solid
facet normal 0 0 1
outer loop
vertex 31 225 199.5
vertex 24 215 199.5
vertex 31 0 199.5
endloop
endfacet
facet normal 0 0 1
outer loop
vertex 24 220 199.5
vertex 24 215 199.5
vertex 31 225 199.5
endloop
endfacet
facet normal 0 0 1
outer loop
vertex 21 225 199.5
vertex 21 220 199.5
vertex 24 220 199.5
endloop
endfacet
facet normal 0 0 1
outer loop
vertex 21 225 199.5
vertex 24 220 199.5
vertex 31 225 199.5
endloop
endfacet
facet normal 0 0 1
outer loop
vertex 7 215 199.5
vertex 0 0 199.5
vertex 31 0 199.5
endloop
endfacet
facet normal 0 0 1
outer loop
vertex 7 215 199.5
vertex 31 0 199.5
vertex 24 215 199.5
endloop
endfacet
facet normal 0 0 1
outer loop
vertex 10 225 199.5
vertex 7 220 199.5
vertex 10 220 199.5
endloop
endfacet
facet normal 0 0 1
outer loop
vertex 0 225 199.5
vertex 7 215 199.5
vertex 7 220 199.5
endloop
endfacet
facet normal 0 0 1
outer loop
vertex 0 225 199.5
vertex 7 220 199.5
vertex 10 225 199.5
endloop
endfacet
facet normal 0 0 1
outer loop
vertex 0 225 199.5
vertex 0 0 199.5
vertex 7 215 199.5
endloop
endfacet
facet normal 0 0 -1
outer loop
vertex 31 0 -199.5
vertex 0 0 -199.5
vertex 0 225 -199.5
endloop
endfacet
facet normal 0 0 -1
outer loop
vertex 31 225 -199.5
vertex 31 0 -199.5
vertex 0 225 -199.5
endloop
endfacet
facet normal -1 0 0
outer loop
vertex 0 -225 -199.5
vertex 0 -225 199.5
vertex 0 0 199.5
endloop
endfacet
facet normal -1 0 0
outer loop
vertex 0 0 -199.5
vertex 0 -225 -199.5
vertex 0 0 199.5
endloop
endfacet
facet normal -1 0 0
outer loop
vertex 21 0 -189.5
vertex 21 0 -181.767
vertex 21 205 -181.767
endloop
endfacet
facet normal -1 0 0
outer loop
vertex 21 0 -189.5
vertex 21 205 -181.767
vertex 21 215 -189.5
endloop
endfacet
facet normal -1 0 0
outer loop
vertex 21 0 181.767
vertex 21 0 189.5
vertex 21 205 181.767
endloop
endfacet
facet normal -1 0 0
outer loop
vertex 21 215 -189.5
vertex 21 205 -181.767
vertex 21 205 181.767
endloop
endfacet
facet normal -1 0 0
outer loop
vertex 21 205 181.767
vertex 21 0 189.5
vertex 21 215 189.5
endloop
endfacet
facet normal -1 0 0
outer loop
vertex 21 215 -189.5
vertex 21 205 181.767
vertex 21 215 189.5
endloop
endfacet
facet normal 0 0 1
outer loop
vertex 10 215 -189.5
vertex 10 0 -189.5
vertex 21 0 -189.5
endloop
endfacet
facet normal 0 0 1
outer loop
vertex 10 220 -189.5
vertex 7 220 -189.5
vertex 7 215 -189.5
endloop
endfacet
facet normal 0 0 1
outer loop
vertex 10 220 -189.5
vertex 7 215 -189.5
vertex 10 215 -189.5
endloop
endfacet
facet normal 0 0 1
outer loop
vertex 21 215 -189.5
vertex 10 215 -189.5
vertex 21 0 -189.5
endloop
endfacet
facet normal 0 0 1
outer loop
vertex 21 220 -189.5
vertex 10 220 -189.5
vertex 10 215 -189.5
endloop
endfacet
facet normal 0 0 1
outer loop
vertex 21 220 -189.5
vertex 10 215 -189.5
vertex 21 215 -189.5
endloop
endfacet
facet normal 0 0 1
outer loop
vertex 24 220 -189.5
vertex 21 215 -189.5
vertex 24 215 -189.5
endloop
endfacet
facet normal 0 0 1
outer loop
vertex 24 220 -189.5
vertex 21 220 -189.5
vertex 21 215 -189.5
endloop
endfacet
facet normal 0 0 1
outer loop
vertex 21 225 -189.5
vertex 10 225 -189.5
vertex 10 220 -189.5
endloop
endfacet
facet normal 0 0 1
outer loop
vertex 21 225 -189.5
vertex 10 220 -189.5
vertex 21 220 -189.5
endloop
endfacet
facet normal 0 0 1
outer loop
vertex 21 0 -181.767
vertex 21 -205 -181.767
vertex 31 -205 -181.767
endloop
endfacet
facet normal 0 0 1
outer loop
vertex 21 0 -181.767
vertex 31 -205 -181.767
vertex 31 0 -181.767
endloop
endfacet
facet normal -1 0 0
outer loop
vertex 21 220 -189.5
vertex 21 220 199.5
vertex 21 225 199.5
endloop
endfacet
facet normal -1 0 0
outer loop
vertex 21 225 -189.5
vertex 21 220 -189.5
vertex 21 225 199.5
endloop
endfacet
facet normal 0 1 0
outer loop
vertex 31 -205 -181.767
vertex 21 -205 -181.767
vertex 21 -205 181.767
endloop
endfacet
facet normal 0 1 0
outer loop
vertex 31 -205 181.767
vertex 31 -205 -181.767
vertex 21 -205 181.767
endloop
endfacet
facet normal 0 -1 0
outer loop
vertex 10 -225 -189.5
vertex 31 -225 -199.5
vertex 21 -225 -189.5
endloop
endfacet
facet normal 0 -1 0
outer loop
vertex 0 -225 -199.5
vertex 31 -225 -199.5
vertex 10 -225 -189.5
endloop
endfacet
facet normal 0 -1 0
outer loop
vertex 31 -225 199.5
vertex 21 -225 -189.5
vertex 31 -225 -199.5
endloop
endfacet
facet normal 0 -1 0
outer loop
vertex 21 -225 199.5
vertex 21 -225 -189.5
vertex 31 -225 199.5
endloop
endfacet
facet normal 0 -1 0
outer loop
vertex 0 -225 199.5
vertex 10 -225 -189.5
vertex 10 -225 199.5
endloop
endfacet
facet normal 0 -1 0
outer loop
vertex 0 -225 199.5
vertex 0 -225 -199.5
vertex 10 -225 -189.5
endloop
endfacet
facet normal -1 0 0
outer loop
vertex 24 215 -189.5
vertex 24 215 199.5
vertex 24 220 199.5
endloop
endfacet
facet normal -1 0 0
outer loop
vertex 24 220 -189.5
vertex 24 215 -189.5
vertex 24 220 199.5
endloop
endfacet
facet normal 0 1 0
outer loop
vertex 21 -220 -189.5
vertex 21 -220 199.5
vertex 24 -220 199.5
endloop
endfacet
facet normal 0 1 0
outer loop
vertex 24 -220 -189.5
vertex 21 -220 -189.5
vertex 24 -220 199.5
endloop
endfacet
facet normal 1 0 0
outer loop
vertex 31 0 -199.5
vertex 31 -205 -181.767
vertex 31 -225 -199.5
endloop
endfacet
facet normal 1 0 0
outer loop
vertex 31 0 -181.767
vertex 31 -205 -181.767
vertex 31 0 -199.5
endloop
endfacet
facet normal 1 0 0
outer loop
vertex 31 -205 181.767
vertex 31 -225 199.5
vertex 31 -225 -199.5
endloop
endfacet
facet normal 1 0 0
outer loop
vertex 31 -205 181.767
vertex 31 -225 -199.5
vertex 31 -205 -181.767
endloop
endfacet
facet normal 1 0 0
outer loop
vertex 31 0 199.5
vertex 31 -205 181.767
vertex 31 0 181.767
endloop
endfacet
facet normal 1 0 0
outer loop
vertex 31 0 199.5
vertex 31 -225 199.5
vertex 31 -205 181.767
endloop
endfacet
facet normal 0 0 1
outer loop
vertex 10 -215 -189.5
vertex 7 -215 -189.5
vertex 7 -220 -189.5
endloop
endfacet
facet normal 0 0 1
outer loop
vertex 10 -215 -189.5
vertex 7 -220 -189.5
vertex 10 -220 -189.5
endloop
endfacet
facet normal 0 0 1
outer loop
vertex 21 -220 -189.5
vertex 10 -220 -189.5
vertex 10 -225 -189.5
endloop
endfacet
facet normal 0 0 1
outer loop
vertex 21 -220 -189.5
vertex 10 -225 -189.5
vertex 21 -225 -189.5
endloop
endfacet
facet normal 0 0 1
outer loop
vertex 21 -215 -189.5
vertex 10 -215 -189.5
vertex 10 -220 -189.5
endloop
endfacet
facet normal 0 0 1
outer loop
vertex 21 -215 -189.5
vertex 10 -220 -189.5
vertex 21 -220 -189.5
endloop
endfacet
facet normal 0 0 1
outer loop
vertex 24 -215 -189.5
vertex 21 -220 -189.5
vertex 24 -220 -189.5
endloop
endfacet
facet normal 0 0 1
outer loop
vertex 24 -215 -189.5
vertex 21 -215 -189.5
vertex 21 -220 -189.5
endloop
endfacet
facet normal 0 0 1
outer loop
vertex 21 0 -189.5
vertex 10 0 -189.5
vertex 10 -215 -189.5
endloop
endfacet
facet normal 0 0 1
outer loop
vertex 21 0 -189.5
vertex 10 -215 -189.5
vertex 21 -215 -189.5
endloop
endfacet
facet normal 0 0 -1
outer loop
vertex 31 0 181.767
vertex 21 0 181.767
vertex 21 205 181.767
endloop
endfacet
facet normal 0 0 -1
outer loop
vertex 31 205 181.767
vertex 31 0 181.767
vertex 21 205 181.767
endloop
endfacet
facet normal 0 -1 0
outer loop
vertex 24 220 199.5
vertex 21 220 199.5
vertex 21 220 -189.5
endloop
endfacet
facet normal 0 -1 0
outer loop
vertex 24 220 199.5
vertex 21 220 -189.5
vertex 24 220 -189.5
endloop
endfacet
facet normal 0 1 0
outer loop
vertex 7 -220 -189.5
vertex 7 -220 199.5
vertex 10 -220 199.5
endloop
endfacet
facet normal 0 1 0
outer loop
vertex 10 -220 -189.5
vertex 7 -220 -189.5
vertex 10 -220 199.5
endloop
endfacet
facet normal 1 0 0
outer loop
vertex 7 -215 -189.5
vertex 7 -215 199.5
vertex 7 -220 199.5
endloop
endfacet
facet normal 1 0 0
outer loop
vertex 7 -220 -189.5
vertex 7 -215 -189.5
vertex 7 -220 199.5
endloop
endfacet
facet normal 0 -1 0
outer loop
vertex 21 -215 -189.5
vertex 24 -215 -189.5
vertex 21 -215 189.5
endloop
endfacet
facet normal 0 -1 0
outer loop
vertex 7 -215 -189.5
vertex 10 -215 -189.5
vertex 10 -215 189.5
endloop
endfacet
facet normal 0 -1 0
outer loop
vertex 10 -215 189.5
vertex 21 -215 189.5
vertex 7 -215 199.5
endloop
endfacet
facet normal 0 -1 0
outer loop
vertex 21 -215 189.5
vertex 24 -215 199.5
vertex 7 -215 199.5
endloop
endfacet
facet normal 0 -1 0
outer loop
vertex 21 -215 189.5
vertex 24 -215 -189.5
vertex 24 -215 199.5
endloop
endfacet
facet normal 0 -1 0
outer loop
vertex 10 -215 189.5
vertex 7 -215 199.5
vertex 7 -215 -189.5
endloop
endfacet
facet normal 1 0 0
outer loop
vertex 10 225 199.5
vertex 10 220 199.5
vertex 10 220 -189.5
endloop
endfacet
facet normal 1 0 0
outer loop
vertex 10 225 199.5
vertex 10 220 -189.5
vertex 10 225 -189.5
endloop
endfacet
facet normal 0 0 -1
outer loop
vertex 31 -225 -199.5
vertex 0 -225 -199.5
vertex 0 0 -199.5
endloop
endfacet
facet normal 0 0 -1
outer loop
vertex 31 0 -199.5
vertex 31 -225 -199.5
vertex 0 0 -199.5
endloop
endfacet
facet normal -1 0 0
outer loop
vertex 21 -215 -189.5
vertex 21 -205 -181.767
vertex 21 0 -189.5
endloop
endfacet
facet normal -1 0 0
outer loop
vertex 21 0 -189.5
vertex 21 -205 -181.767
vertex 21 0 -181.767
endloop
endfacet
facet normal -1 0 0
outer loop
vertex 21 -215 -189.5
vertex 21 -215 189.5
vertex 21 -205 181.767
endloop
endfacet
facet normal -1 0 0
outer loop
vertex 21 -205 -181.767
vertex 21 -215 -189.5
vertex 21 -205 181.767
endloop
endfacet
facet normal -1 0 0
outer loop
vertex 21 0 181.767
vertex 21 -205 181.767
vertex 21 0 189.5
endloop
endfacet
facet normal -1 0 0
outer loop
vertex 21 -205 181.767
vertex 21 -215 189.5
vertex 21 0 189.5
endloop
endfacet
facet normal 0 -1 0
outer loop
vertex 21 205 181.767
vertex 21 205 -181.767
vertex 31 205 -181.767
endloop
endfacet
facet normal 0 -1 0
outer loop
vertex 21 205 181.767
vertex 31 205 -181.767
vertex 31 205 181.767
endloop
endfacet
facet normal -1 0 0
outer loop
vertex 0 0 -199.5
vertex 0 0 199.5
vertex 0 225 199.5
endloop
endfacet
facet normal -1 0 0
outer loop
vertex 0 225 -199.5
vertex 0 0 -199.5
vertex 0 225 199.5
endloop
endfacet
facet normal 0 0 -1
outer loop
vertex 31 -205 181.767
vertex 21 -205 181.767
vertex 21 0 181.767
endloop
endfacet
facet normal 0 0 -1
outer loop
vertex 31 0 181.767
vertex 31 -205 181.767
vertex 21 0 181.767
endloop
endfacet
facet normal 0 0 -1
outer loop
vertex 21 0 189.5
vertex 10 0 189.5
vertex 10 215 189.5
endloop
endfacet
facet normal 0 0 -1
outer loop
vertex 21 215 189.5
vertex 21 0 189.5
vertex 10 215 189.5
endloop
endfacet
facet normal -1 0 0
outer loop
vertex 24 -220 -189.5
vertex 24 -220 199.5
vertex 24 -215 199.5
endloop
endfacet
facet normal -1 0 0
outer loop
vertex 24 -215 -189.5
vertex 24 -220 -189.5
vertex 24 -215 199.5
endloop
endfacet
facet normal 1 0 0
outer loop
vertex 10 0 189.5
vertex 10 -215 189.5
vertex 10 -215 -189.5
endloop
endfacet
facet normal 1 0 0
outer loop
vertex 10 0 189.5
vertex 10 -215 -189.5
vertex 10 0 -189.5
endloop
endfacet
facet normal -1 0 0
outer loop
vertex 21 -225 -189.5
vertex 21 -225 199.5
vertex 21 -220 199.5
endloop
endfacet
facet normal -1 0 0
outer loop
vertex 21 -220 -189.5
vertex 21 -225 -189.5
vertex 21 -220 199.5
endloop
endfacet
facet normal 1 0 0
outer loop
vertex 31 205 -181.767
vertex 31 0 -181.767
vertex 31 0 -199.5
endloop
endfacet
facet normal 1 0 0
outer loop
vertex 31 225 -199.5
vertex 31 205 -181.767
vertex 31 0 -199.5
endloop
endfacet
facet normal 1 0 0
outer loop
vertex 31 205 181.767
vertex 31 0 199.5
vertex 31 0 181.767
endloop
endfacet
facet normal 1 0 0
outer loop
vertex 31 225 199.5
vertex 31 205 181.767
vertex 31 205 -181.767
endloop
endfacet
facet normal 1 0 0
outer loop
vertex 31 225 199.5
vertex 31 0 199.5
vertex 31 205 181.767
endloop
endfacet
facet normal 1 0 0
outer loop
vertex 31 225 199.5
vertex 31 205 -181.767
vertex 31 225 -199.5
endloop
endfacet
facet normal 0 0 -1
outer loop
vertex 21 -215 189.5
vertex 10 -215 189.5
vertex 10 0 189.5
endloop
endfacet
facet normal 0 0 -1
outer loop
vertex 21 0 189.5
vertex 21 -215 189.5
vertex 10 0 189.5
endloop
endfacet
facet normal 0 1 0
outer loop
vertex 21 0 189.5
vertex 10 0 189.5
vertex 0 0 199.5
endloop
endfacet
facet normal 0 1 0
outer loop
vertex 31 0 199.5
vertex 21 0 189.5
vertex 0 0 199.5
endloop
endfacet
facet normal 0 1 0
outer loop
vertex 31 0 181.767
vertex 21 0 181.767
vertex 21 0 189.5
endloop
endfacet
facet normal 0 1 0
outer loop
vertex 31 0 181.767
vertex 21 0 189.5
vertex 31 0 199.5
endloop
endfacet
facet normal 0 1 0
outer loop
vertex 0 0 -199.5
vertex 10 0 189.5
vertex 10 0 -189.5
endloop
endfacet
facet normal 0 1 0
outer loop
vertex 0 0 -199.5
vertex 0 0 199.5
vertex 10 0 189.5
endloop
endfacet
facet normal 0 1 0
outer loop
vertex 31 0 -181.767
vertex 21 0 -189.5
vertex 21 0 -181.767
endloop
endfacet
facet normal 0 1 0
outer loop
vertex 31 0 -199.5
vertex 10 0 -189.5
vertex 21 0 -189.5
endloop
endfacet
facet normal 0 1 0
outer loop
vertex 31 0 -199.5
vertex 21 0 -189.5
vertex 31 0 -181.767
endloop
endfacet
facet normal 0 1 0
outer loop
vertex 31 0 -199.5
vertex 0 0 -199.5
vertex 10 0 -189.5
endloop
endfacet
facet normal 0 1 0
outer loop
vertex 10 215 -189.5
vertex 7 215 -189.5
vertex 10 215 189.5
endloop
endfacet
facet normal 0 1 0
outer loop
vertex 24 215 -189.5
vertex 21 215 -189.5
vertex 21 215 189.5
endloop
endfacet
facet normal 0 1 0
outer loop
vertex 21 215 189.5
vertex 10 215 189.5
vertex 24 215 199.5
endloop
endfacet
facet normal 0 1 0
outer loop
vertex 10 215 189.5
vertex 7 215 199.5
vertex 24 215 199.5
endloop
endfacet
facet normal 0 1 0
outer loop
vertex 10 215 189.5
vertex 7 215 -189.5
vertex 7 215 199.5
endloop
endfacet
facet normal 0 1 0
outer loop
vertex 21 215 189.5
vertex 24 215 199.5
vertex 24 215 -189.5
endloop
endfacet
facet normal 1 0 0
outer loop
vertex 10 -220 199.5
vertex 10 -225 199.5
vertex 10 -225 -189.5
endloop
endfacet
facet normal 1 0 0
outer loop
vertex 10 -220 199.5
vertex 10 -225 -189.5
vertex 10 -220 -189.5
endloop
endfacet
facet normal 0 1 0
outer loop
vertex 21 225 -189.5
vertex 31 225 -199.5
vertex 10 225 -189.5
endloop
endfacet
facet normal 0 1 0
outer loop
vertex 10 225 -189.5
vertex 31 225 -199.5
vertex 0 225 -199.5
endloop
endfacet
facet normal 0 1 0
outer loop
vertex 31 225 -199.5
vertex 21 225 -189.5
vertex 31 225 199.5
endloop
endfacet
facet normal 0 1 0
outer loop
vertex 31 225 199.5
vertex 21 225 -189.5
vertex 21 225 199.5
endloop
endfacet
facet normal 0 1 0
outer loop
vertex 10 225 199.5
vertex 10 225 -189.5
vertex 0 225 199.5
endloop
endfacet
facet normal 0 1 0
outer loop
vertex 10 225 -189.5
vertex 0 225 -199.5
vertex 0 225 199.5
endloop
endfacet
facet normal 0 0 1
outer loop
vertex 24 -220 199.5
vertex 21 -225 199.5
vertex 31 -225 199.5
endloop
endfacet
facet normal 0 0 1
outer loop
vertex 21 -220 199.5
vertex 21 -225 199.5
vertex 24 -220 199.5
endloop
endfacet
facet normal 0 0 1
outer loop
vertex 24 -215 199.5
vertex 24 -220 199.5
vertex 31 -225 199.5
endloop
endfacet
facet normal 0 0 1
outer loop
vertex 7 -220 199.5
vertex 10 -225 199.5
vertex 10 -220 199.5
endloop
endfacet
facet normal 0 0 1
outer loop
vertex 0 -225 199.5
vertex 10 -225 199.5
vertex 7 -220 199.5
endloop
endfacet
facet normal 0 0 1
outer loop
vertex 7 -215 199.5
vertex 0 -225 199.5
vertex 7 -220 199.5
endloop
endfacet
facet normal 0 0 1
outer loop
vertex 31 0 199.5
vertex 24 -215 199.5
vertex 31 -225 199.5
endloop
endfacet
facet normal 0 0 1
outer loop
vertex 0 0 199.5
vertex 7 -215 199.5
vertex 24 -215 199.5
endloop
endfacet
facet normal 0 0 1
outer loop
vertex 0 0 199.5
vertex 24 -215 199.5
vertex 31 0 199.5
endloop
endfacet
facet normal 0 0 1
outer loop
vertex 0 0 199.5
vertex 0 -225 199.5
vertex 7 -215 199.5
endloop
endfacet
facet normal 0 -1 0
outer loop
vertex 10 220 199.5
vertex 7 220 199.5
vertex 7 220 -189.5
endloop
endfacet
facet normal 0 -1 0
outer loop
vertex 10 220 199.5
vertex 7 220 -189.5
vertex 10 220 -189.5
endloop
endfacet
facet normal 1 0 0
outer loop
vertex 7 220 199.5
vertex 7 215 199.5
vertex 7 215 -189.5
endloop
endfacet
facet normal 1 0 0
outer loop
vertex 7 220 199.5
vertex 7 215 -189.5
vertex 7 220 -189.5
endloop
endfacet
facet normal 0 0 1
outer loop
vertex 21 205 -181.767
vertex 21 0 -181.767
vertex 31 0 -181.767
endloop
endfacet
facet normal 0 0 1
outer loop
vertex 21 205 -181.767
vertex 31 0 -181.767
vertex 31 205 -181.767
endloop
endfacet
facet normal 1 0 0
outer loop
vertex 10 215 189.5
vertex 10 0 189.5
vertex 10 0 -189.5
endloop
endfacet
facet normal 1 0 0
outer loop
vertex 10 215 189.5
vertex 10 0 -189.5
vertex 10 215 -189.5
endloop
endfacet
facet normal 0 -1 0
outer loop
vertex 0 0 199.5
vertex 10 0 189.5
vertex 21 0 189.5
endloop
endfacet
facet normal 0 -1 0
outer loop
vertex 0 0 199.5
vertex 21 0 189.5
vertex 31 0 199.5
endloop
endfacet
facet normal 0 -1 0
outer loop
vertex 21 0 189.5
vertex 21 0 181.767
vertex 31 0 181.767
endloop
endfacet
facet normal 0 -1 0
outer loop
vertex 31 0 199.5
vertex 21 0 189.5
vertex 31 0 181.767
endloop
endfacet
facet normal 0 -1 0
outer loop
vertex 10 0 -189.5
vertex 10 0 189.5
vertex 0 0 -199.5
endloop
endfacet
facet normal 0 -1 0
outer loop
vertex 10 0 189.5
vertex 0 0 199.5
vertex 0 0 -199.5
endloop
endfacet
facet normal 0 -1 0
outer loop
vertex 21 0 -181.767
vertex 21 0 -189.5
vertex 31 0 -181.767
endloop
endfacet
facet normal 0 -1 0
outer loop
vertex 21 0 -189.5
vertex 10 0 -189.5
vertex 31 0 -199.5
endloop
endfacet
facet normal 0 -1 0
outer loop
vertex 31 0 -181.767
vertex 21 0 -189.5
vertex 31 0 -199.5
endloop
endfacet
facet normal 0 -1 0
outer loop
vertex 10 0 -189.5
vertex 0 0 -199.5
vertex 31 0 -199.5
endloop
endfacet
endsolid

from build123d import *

# Parameters (mm, degrees)
SKETCH1_W              = 450
SKETCH1_H              = 399
BOSS_EXTRUDE1_DEPTH    = 10
SKETCH3_W              = 450
SKETCH3_H              = 399
SKETCH3_W_2            = 430
SKETCH3_H_2            = 379
BOSS_EXTRUDE2_DEPTH    = 11
SKETCH5_W              = 450
SKETCH5_H              = 399
SKETCH5_W_2            = 410
SKETCH5_H_2            = 363.533333334
BOSS_EXTRUDE3_DEPTH    = 10
SKETCH7_W              = 11
SKETCH7_H              = 5
SKETCH7_W_2            = 17
CUT_EXTRUDE1_DEPTH     = 389
SPLIT1_SURFACE_1_BACK  = 603.214
SPLIT1_SURFACE_1_DEPTH = 1206.428
SPLIT1_SURFACE_2_BACK  = 603.214
SPLIT1_SURFACE_2_DEPTH = 1206.428


with BuildPart() as part:
    # Sketch1 → Boss-Extrude1 (new body)
    with BuildSketch(Plane.YZ):
        Rectangle(SKETCH1_W, SKETCH1_H)
    extrude(amount=BOSS_EXTRUDE1_DEPTH)

    # Sketch3 → Boss-Extrude2 (add)
    with BuildSketch(Plane.YZ.offset(10)):
        Rectangle(SKETCH3_W, SKETCH3_H)
        Rectangle(SKETCH3_W_2, SKETCH3_H_2, mode=Mode.SUBTRACT)
    extrude(amount=BOSS_EXTRUDE2_DEPTH)

    # Sketch5 → Boss-Extrude3 (add)
    with BuildSketch(Plane.YZ.offset(21)):
        Rectangle(SKETCH5_W, SKETCH5_H)
        Rectangle(SKETCH5_W_2, SKETCH5_H_2, mode=Mode.SUBTRACT)
    extrude(amount=BOSS_EXTRUDE3_DEPTH)

    # Sketch7 → Cut-Extrude1 (cut)
    with BuildSketch(Plane.XY.offset(199.5)):
        with Locations((15.5, -222.5)):
            Rectangle(SKETCH7_W, SKETCH7_H)
        Polygon((7, -220), (10, -220), (21, -220), (24, -220), (24, -215), (7, -215), align=None)
        with Locations((15.5, 222.5)):
            Rectangle(SKETCH7_W, SKETCH7_H)
        with Locations((15.5, 217.5)):
            Rectangle(SKETCH7_W_2, SKETCH7_H)
    extrude(amount=-CUT_EXTRUDE1_DEPTH, mode=Mode.SUBTRACT)


with BuildPart() as body_2:
    # Split1: the piece behind the surface
    add(part.part)
    # Split1 surface: a surface, the sketch's curves swept straight by 1206.428 mm
    with BuildLine(Plane.XY.offset(199.5).offset(-SPLIT1_SURFACE_1_BACK), mode=Mode.PRIVATE) as split1_surface_1_path:
        Line((0, 0), (31, 0))
    split1_surface_1 = Shell.extrude(split1_surface_1_path.wire(), (0 * SPLIT1_SURFACE_1_DEPTH, 0 * SPLIT1_SURFACE_1_DEPTH, 1 * SPLIT1_SURFACE_1_DEPTH))
    split(bisect_by=split1_surface_1, keep=Keep.BOTTOM)


with BuildPart() as part_1:
    add(part.part)

    # Split1: split by a surface, the side it looks to stays
    # Split1 surface: a surface, the sketch's curves swept straight by 1206.428 mm
    with BuildLine(Plane.XY.offset(199.5).offset(-SPLIT1_SURFACE_2_BACK), mode=Mode.PRIVATE) as split1_surface_2_path:
        Line((0, 0), (31, 0))
    split1_surface_2 = Shell.extrude(split1_surface_2_path.wire(), (0 * SPLIT1_SURFACE_2_DEPTH, 0 * SPLIT1_SURFACE_2_DEPTH, 1 * SPLIT1_SURFACE_2_DEPTH))
    split(bisect_by=split1_surface_2, keep=Keep.TOP)


solid = Compound([body_2.part, part_1.part])
